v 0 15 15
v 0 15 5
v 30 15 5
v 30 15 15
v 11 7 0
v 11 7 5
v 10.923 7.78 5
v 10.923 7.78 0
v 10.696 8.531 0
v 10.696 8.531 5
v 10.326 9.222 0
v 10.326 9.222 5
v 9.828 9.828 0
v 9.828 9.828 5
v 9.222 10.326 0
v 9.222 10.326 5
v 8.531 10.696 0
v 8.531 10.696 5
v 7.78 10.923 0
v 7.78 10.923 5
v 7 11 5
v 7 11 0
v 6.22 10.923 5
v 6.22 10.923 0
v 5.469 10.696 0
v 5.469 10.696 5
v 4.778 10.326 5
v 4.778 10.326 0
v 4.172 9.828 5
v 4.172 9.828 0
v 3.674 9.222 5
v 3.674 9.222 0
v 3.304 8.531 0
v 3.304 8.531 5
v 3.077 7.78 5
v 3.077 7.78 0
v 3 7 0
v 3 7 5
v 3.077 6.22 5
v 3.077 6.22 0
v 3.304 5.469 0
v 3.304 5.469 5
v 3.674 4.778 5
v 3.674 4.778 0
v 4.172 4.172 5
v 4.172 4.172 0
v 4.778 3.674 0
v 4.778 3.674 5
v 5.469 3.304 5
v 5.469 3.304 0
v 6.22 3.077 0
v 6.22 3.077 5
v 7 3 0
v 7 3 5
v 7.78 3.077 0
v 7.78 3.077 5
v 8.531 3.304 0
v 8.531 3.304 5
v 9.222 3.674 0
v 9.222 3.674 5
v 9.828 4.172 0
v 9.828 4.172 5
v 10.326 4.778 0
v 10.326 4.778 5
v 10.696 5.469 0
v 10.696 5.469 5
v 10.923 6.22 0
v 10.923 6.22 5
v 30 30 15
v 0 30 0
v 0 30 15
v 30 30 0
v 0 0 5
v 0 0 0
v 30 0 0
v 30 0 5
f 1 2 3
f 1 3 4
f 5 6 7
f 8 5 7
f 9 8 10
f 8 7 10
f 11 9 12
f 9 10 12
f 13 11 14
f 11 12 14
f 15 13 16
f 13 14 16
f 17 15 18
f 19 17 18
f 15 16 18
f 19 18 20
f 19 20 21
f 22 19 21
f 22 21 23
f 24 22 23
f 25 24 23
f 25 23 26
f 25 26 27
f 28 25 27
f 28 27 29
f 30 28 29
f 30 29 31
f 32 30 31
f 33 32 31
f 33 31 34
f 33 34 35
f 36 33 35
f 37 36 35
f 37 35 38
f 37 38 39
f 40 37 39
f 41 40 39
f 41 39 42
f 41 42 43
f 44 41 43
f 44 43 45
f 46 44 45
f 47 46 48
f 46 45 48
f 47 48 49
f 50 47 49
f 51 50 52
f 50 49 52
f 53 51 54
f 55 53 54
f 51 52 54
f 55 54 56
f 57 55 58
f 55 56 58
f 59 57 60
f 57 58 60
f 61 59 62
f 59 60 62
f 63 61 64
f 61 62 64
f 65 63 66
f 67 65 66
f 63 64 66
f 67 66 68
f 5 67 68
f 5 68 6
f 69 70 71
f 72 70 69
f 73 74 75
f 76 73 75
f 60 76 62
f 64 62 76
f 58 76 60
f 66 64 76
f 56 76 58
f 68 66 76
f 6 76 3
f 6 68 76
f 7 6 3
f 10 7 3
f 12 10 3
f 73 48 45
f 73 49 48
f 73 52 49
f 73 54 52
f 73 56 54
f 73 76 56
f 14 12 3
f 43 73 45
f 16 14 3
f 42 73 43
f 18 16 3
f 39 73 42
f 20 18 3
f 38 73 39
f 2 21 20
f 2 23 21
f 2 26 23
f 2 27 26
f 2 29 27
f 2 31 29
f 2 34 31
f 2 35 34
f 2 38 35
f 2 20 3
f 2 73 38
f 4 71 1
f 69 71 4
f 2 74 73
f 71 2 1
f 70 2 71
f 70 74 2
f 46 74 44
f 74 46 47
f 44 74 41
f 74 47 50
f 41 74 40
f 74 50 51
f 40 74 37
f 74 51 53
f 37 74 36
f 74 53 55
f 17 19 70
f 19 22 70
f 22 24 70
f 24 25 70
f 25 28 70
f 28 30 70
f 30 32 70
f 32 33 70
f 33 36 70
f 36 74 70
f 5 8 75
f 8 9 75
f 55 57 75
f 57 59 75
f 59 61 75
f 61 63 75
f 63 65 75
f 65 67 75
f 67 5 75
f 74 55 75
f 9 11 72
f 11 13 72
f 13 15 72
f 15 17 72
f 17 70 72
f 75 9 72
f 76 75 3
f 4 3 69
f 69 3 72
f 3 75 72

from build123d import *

# Parameters (mm, degrees)
SKETCH_1_W          = 30
SKETCH_1_H          = 30
EXTRUDE_1_DEPTH     = 15
SKETCH_2_R          = 4
CUT_EXTRUDE_1_DEPTH = 46
SKETCH_3_W          = 10
SKETCH_3_H          = 15
CUT_EXTRUDE_2_DEPTH = 46


with BuildPart() as part:
    # 草图1 → 凸台-拉伸1 (new body)
    with BuildSketch(Plane.XY):
        with Locations((15, 15)):
            Rectangle(SKETCH_1_W, SKETCH_1_H)
    extrude(amount=EXTRUDE_1_DEPTH)

    # 草图2 → 切除-拉伸1 (cut, through all)
    with BuildSketch(Plane.XY.offset(15)):
        with Locations((7, 7)):
            Circle(SKETCH_2_R)
    extrude(amount=-CUT_EXTRUDE_1_DEPTH, mode=Mode.SUBTRACT)

    # 草图3 → 切除-拉伸2 (cut, through all)
    with BuildSketch(Plane.ZY):
        with Locations((10, 7.5)):
            Rectangle(SKETCH_3_W, SKETCH_3_H)
    extrude(amount=-CUT_EXTRUDE_2_DEPTH, mode=Mode.SUBTRACT)


solid = part.part
